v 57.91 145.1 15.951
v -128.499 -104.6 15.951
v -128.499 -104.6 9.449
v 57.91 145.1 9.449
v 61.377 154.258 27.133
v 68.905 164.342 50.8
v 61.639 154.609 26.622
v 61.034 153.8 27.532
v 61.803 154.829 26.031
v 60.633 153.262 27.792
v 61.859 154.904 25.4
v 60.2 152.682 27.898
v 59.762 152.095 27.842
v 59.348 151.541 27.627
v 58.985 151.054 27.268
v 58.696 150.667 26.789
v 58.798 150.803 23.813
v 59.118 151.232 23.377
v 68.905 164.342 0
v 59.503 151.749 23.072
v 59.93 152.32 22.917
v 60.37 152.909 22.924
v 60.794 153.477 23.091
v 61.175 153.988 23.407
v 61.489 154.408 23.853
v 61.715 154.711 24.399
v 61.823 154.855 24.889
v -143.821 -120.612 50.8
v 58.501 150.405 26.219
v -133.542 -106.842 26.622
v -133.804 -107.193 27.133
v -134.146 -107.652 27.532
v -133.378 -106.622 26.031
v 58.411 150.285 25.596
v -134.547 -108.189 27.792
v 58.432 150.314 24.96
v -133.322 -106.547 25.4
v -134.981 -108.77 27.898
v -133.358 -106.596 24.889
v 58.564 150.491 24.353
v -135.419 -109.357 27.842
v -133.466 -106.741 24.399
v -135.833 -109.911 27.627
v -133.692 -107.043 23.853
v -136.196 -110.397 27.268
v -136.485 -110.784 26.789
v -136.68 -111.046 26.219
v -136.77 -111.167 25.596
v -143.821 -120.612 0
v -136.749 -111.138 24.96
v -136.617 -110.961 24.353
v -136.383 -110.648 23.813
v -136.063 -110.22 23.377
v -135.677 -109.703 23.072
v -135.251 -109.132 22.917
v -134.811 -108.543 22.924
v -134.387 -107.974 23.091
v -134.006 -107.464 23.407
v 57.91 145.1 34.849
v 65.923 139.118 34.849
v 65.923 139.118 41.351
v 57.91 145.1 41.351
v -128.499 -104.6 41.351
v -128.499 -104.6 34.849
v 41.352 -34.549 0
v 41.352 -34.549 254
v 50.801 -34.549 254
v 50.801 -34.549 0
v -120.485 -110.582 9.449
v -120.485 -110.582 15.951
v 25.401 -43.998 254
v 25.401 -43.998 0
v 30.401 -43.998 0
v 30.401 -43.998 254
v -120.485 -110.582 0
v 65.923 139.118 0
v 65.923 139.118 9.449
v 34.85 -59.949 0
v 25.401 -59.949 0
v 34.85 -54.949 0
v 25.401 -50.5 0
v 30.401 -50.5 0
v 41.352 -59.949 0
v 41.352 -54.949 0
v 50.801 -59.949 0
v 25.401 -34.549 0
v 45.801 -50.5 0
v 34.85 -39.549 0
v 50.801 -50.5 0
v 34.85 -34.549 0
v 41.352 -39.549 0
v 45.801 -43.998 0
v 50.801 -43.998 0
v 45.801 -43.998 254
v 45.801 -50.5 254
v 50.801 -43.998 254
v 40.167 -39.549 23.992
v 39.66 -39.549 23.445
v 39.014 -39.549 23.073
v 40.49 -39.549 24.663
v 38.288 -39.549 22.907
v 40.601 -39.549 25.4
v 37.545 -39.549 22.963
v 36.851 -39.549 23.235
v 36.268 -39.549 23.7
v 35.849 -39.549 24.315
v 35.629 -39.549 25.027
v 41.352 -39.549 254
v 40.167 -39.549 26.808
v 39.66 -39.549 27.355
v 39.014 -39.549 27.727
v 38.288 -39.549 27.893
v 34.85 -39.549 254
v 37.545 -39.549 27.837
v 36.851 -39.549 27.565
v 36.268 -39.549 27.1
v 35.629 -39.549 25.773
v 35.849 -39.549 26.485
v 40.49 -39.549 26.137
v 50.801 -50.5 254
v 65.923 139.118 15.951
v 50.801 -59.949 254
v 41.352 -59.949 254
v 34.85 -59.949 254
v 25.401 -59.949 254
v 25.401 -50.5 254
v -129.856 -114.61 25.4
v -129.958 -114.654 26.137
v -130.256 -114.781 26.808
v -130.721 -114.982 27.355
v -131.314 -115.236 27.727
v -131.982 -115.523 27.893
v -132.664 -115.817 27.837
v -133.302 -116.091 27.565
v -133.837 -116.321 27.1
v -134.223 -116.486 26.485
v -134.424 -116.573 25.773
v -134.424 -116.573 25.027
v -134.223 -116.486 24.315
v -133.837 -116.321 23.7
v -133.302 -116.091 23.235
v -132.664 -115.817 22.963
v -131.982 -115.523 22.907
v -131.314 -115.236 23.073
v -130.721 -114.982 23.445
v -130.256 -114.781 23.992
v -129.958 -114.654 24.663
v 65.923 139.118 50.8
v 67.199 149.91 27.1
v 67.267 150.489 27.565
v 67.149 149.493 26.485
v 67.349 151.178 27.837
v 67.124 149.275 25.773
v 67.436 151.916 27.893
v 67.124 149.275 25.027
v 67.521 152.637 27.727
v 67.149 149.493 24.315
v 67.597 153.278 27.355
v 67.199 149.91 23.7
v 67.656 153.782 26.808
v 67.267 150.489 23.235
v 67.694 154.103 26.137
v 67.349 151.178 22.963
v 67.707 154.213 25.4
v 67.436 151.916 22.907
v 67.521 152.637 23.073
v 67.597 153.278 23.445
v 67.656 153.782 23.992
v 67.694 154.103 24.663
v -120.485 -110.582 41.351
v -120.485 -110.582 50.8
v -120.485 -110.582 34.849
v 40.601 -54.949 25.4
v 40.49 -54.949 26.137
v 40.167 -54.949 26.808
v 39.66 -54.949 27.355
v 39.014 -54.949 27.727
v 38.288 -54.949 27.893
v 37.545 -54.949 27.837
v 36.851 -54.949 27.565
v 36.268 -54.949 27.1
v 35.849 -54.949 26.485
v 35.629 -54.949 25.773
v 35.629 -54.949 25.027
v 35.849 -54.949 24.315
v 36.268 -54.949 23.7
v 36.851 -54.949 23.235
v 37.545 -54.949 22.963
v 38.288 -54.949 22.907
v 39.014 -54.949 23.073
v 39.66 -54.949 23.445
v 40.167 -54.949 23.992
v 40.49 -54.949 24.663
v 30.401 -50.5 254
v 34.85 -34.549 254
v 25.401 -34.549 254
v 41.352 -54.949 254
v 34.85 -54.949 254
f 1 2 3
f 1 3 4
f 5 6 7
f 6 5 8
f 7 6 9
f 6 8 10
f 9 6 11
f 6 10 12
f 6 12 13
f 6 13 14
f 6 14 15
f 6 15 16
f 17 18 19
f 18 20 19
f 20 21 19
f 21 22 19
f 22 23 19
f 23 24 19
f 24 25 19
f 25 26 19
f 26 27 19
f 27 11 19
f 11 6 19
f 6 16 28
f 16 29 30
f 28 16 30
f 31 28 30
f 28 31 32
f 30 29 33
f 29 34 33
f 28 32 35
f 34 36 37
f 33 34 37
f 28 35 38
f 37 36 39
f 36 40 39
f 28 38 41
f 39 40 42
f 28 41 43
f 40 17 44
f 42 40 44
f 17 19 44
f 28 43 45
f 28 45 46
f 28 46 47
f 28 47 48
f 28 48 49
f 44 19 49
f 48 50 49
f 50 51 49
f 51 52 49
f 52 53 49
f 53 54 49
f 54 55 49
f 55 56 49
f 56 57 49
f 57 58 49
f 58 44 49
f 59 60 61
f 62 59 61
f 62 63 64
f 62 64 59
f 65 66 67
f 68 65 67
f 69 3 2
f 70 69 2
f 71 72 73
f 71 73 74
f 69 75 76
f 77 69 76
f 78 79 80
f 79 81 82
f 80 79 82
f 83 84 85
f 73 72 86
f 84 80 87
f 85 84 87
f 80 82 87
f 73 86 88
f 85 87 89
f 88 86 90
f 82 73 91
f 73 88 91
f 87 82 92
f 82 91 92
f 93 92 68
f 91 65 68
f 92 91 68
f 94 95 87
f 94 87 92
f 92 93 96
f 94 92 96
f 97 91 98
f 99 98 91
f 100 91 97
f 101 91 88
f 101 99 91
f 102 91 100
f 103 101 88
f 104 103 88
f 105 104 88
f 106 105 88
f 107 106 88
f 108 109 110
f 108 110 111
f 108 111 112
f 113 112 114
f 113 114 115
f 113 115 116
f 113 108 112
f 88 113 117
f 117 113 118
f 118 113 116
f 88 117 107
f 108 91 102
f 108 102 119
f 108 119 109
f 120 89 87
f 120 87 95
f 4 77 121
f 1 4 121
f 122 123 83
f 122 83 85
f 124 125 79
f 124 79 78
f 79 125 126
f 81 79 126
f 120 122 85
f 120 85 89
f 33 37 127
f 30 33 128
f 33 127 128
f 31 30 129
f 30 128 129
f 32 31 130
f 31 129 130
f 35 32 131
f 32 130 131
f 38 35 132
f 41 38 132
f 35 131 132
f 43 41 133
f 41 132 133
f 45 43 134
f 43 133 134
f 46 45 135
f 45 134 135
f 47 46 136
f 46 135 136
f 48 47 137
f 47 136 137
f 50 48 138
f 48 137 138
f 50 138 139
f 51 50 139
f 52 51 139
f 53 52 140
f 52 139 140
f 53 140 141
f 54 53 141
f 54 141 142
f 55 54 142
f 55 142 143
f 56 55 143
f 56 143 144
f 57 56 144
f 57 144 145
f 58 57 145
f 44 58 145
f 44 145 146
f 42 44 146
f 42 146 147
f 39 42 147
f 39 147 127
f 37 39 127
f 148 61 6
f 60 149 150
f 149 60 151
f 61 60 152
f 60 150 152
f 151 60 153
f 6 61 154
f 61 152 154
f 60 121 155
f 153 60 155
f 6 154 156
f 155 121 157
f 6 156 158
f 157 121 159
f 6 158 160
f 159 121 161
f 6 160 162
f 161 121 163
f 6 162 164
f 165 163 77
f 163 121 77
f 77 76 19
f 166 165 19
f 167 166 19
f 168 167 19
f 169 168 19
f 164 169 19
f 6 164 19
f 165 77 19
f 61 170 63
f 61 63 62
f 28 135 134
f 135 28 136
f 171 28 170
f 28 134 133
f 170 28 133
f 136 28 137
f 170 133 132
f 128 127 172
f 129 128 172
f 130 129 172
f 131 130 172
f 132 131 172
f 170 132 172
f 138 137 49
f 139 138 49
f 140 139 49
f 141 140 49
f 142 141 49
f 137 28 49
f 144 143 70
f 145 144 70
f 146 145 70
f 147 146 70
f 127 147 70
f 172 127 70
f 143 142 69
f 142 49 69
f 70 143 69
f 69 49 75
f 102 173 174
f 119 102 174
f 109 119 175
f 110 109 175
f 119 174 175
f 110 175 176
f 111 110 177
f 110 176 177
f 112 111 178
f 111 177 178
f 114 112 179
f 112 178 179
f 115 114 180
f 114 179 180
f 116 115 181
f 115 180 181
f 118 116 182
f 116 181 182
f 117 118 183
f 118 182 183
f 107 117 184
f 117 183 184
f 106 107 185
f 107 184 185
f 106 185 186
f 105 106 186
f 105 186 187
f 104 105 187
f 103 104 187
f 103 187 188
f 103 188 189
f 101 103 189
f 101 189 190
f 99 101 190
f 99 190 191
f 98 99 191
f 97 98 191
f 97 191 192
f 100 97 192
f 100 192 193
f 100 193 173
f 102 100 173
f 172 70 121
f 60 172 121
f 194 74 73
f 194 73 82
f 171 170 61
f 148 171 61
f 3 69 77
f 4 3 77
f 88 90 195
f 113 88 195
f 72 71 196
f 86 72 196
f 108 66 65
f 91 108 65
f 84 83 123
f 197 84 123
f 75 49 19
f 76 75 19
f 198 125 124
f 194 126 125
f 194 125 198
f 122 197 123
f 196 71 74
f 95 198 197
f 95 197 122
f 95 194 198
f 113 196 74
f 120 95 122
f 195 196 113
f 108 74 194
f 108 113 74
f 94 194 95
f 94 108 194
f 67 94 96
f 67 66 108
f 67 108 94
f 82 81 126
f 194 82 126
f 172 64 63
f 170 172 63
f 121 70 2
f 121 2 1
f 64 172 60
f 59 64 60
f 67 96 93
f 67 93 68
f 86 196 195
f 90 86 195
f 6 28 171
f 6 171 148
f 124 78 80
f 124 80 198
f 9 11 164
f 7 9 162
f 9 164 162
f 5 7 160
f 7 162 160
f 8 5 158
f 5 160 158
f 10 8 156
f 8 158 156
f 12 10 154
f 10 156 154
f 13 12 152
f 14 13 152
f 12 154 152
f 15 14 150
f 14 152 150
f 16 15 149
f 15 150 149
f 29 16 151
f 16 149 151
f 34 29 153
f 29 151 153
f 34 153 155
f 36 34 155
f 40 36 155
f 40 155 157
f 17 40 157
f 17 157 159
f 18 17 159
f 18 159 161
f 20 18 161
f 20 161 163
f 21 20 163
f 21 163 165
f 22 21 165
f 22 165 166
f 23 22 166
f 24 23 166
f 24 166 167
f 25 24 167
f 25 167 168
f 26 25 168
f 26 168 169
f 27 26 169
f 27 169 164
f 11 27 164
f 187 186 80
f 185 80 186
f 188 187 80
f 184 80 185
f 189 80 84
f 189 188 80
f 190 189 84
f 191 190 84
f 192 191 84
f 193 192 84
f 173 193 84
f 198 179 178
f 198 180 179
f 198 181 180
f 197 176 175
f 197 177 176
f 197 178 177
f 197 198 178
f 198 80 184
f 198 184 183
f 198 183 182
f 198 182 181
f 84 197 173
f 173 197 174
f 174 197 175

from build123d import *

# Parameters (mm, degrees)
F1_DEPTH  = 50.8
F2_W      = 311.6059094878
F2_H      = 6.5024
F3_DEPTH  = 10
F4_W      = 25.4
F4_H      = 25.4
F5_DEPTH  = 254
F7_W      = 6.5024
F7_H      = 254
F10_DEPTH = 5
F11_DEPTH = 5
F8_W      = 6.5024
F8_H      = 254
F12_DEPTH = 5
F6_W      = 6.5024
F6_H      = 254
F13_DEPTH = 5
F14_R     = 2.5
F15_DEPTH = 100
F16_R     = 2.5
F17_DEPTH = 25
F18_R     = 2.5
F19_DEPTH = 25


with BuildPart() as f1:
    # F0 (on Top) → F1 (new body)
    with BuildSketch(Plane.XY):
        Polygon((65.9228841441, 139.1180368572), (68.9049714361, 164.342373427), (-143.8212714684, -120.6118432109), (-120.4853115595, -110.5822382772), align=None)
    extrude(amount=F1_DEPTH)

    # F2 (on face) → F3 (cut)
    with BuildSketch(Plane(origin=(-24.357866694, 18.1838245039, 0), x_dir=(0.5982177809, 0.8013335676, 0), z_dir=(0.8013335676, -0.5982177809, 0))):
        with Locations((-4.8867604855, 38.1)):
            Rectangle(F2_W, F2_H)
        with Locations((-4.8867604855, 12.7)):
            Rectangle(F2_W, F2_H)
    extrude(amount=-F3_DEPTH, mode=Mode.SUBTRACT)

    # F14 (on face) → F15 (cut)
    with BuildSketch(Plane(origin=(48.7940107522, -5.7685560525, 0), x_dir=(0.1174050115, 0.9930841169, 0), z_dir=(0.9930841169, -0.1174050115, 0))):
        with Locations((158.5955897506, 25.4)):
            Circle(F14_R)
    extrude(amount=-F15_DEPTH, mode=Mode.SUBTRACT)

    # F16 (on face) → F17 (cut)
    with BuildSketch(Plane(origin=(21.3309064992, -49.6307862751, 0), x_dir=(0.9187385791, 0.394866336, 0), z_dir=(0.394866336, -0.9187385791, 0))):
        with Locations((-167.059707196, 25.4)):
            Circle(F16_R)
    extrude(amount=-F17_DEPTH, mode=Mode.SUBTRACT)


with BuildPart() as f5:
    # F4 (on Top) → F5 (new body)
    with BuildSketch(Plane.XY):
        with Locations((38.1011031568, -47.2492938419)):
            Rectangle(F4_W, F4_H)
    extrude(amount=F5_DEPTH)

    # F7 (on face) → F10 (cut)
    with BuildSketch(Plane.YZ.offset(50.8011031568)):
        with Locations((-47.2492938419, 127)):
            Rectangle(F7_W, F7_H)
    extrude(amount=-F10_DEPTH, mode=Mode.SUBTRACT)

    # F9 (on face) → F11 (cut)
    with BuildSketch(Plane(origin=(0, -34.5492938419, 0), x_dir=(-1, 0, 0), z_dir=(0, 1, 0))):
        Polygon((-38.7320419943, 0), (-34.8499031568, 0), (-34.8499031568, 254), (-41.3523031568, 254), (-41.3523031568, 0), align=None)
    extrude(amount=-F11_DEPTH, mode=Mode.SUBTRACT)

    # F8 (on face) → F12 (cut)
    with BuildSketch(Plane(origin=(25.4011031568, 0, 0), x_dir=(0, -1, 0), z_dir=(-1, 0, 0))):
        with Locations((47.2492938419, 127)):
            Rectangle(F8_W, F8_H)
    extrude(amount=-F12_DEPTH, mode=Mode.SUBTRACT)

    # F6 (on face) → F13 (cut)
    with BuildSketch(Plane.XZ.offset(59.9492938419)):
        with Locations((38.1011031568, 127)):
            Rectangle(F6_W, F6_H)
    extrude(amount=-F13_DEPTH, mode=Mode.SUBTRACT)

    # F18 (on face) → F19 (cut)
    with BuildSketch(Plane.XZ.offset(54.9492938419)):
        with Locations((38.1011031568, 25.4)):
            Circle(F18_R)
    extrude(amount=-F19_DEPTH, mode=Mode.SUBTRACT)


solid = Compound([f1.part, f5.part])
